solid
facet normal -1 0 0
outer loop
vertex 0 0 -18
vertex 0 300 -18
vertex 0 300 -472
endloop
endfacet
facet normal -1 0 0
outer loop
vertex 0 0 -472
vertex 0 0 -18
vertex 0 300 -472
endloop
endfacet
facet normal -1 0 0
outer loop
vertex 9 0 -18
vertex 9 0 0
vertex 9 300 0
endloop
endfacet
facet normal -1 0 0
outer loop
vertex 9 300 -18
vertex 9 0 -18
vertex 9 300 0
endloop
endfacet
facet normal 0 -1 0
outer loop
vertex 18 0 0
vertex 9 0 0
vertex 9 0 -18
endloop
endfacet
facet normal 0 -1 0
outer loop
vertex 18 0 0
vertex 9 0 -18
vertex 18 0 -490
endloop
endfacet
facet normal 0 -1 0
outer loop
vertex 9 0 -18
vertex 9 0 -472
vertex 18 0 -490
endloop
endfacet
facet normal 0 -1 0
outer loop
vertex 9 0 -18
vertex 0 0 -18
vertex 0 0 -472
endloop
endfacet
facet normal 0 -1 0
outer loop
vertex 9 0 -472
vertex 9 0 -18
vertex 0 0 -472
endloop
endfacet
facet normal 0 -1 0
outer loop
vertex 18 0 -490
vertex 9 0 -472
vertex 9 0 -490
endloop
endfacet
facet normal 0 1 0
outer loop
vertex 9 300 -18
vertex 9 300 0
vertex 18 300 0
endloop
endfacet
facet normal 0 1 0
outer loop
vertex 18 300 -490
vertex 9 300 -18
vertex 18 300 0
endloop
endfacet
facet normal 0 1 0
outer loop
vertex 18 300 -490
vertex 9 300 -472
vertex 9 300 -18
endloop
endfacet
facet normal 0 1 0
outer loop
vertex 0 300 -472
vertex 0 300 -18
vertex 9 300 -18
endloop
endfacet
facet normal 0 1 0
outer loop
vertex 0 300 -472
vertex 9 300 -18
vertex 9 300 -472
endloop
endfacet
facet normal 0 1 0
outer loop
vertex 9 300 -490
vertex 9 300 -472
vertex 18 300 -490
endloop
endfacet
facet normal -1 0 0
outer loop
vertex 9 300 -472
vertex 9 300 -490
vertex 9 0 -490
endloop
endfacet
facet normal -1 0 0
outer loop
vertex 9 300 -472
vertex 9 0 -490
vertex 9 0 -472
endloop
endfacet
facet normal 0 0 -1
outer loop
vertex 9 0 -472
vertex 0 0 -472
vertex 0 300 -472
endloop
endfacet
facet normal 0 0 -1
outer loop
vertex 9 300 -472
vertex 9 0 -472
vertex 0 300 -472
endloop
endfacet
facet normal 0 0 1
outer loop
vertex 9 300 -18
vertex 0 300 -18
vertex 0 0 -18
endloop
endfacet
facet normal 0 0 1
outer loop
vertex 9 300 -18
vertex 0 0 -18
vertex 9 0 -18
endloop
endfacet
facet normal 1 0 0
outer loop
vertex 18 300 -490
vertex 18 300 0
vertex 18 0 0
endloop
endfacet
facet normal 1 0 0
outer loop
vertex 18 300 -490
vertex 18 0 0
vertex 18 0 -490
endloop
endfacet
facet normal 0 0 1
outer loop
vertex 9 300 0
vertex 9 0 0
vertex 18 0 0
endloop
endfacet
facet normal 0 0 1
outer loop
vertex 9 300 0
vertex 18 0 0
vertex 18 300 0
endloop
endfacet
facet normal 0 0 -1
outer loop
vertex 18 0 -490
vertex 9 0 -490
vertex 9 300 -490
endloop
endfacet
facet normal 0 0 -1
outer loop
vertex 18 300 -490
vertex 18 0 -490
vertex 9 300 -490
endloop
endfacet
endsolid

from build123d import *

# Parameters (mm, degrees)
SKETCH1_W           = 490
SKETCH1_H           = 300
BOSS_EXTRUDE1_DEPTH = 18
SKETCH5_W           = 9
SKETCH5_H           = 300
CUT_EXTRUDE1_DEPTH  = 18
SKETCH6_W           = 18
SKETCH6_H           = 300
CUT_EXTRUDE3_DEPTH  = 9


with BuildPart() as part:
    # Sketch1 → Boss-Extrude1 (new body)
    with BuildSketch(Plane(origin=(0, 0, 0), x_dir=(0, 0, -1), z_dir=(1, 0, 0))):
        with Locations((245, 150)):
            Rectangle(SKETCH1_W, SKETCH1_H)
    extrude(amount=BOSS_EXTRUDE1_DEPTH)

    # Sketch5 → Cut-Extrude1 (cut)
    with BuildSketch(Plane.XY):
        with Locations((4.5, 150)):
            Rectangle(SKETCH5_W, SKETCH5_H)
    extrude(amount=-CUT_EXTRUDE1_DEPTH, mode=Mode.SUBTRACT)

    # Sketch6 → Cut-Extrude3 (cut)
    with BuildSketch(Plane.ZY):
        with Locations((-481, 150)):
            Rectangle(SKETCH6_W, SKETCH6_H)
    extrude(amount=-CUT_EXTRUDE3_DEPTH, mode=Mode.SUBTRACT)


solid = part.part
